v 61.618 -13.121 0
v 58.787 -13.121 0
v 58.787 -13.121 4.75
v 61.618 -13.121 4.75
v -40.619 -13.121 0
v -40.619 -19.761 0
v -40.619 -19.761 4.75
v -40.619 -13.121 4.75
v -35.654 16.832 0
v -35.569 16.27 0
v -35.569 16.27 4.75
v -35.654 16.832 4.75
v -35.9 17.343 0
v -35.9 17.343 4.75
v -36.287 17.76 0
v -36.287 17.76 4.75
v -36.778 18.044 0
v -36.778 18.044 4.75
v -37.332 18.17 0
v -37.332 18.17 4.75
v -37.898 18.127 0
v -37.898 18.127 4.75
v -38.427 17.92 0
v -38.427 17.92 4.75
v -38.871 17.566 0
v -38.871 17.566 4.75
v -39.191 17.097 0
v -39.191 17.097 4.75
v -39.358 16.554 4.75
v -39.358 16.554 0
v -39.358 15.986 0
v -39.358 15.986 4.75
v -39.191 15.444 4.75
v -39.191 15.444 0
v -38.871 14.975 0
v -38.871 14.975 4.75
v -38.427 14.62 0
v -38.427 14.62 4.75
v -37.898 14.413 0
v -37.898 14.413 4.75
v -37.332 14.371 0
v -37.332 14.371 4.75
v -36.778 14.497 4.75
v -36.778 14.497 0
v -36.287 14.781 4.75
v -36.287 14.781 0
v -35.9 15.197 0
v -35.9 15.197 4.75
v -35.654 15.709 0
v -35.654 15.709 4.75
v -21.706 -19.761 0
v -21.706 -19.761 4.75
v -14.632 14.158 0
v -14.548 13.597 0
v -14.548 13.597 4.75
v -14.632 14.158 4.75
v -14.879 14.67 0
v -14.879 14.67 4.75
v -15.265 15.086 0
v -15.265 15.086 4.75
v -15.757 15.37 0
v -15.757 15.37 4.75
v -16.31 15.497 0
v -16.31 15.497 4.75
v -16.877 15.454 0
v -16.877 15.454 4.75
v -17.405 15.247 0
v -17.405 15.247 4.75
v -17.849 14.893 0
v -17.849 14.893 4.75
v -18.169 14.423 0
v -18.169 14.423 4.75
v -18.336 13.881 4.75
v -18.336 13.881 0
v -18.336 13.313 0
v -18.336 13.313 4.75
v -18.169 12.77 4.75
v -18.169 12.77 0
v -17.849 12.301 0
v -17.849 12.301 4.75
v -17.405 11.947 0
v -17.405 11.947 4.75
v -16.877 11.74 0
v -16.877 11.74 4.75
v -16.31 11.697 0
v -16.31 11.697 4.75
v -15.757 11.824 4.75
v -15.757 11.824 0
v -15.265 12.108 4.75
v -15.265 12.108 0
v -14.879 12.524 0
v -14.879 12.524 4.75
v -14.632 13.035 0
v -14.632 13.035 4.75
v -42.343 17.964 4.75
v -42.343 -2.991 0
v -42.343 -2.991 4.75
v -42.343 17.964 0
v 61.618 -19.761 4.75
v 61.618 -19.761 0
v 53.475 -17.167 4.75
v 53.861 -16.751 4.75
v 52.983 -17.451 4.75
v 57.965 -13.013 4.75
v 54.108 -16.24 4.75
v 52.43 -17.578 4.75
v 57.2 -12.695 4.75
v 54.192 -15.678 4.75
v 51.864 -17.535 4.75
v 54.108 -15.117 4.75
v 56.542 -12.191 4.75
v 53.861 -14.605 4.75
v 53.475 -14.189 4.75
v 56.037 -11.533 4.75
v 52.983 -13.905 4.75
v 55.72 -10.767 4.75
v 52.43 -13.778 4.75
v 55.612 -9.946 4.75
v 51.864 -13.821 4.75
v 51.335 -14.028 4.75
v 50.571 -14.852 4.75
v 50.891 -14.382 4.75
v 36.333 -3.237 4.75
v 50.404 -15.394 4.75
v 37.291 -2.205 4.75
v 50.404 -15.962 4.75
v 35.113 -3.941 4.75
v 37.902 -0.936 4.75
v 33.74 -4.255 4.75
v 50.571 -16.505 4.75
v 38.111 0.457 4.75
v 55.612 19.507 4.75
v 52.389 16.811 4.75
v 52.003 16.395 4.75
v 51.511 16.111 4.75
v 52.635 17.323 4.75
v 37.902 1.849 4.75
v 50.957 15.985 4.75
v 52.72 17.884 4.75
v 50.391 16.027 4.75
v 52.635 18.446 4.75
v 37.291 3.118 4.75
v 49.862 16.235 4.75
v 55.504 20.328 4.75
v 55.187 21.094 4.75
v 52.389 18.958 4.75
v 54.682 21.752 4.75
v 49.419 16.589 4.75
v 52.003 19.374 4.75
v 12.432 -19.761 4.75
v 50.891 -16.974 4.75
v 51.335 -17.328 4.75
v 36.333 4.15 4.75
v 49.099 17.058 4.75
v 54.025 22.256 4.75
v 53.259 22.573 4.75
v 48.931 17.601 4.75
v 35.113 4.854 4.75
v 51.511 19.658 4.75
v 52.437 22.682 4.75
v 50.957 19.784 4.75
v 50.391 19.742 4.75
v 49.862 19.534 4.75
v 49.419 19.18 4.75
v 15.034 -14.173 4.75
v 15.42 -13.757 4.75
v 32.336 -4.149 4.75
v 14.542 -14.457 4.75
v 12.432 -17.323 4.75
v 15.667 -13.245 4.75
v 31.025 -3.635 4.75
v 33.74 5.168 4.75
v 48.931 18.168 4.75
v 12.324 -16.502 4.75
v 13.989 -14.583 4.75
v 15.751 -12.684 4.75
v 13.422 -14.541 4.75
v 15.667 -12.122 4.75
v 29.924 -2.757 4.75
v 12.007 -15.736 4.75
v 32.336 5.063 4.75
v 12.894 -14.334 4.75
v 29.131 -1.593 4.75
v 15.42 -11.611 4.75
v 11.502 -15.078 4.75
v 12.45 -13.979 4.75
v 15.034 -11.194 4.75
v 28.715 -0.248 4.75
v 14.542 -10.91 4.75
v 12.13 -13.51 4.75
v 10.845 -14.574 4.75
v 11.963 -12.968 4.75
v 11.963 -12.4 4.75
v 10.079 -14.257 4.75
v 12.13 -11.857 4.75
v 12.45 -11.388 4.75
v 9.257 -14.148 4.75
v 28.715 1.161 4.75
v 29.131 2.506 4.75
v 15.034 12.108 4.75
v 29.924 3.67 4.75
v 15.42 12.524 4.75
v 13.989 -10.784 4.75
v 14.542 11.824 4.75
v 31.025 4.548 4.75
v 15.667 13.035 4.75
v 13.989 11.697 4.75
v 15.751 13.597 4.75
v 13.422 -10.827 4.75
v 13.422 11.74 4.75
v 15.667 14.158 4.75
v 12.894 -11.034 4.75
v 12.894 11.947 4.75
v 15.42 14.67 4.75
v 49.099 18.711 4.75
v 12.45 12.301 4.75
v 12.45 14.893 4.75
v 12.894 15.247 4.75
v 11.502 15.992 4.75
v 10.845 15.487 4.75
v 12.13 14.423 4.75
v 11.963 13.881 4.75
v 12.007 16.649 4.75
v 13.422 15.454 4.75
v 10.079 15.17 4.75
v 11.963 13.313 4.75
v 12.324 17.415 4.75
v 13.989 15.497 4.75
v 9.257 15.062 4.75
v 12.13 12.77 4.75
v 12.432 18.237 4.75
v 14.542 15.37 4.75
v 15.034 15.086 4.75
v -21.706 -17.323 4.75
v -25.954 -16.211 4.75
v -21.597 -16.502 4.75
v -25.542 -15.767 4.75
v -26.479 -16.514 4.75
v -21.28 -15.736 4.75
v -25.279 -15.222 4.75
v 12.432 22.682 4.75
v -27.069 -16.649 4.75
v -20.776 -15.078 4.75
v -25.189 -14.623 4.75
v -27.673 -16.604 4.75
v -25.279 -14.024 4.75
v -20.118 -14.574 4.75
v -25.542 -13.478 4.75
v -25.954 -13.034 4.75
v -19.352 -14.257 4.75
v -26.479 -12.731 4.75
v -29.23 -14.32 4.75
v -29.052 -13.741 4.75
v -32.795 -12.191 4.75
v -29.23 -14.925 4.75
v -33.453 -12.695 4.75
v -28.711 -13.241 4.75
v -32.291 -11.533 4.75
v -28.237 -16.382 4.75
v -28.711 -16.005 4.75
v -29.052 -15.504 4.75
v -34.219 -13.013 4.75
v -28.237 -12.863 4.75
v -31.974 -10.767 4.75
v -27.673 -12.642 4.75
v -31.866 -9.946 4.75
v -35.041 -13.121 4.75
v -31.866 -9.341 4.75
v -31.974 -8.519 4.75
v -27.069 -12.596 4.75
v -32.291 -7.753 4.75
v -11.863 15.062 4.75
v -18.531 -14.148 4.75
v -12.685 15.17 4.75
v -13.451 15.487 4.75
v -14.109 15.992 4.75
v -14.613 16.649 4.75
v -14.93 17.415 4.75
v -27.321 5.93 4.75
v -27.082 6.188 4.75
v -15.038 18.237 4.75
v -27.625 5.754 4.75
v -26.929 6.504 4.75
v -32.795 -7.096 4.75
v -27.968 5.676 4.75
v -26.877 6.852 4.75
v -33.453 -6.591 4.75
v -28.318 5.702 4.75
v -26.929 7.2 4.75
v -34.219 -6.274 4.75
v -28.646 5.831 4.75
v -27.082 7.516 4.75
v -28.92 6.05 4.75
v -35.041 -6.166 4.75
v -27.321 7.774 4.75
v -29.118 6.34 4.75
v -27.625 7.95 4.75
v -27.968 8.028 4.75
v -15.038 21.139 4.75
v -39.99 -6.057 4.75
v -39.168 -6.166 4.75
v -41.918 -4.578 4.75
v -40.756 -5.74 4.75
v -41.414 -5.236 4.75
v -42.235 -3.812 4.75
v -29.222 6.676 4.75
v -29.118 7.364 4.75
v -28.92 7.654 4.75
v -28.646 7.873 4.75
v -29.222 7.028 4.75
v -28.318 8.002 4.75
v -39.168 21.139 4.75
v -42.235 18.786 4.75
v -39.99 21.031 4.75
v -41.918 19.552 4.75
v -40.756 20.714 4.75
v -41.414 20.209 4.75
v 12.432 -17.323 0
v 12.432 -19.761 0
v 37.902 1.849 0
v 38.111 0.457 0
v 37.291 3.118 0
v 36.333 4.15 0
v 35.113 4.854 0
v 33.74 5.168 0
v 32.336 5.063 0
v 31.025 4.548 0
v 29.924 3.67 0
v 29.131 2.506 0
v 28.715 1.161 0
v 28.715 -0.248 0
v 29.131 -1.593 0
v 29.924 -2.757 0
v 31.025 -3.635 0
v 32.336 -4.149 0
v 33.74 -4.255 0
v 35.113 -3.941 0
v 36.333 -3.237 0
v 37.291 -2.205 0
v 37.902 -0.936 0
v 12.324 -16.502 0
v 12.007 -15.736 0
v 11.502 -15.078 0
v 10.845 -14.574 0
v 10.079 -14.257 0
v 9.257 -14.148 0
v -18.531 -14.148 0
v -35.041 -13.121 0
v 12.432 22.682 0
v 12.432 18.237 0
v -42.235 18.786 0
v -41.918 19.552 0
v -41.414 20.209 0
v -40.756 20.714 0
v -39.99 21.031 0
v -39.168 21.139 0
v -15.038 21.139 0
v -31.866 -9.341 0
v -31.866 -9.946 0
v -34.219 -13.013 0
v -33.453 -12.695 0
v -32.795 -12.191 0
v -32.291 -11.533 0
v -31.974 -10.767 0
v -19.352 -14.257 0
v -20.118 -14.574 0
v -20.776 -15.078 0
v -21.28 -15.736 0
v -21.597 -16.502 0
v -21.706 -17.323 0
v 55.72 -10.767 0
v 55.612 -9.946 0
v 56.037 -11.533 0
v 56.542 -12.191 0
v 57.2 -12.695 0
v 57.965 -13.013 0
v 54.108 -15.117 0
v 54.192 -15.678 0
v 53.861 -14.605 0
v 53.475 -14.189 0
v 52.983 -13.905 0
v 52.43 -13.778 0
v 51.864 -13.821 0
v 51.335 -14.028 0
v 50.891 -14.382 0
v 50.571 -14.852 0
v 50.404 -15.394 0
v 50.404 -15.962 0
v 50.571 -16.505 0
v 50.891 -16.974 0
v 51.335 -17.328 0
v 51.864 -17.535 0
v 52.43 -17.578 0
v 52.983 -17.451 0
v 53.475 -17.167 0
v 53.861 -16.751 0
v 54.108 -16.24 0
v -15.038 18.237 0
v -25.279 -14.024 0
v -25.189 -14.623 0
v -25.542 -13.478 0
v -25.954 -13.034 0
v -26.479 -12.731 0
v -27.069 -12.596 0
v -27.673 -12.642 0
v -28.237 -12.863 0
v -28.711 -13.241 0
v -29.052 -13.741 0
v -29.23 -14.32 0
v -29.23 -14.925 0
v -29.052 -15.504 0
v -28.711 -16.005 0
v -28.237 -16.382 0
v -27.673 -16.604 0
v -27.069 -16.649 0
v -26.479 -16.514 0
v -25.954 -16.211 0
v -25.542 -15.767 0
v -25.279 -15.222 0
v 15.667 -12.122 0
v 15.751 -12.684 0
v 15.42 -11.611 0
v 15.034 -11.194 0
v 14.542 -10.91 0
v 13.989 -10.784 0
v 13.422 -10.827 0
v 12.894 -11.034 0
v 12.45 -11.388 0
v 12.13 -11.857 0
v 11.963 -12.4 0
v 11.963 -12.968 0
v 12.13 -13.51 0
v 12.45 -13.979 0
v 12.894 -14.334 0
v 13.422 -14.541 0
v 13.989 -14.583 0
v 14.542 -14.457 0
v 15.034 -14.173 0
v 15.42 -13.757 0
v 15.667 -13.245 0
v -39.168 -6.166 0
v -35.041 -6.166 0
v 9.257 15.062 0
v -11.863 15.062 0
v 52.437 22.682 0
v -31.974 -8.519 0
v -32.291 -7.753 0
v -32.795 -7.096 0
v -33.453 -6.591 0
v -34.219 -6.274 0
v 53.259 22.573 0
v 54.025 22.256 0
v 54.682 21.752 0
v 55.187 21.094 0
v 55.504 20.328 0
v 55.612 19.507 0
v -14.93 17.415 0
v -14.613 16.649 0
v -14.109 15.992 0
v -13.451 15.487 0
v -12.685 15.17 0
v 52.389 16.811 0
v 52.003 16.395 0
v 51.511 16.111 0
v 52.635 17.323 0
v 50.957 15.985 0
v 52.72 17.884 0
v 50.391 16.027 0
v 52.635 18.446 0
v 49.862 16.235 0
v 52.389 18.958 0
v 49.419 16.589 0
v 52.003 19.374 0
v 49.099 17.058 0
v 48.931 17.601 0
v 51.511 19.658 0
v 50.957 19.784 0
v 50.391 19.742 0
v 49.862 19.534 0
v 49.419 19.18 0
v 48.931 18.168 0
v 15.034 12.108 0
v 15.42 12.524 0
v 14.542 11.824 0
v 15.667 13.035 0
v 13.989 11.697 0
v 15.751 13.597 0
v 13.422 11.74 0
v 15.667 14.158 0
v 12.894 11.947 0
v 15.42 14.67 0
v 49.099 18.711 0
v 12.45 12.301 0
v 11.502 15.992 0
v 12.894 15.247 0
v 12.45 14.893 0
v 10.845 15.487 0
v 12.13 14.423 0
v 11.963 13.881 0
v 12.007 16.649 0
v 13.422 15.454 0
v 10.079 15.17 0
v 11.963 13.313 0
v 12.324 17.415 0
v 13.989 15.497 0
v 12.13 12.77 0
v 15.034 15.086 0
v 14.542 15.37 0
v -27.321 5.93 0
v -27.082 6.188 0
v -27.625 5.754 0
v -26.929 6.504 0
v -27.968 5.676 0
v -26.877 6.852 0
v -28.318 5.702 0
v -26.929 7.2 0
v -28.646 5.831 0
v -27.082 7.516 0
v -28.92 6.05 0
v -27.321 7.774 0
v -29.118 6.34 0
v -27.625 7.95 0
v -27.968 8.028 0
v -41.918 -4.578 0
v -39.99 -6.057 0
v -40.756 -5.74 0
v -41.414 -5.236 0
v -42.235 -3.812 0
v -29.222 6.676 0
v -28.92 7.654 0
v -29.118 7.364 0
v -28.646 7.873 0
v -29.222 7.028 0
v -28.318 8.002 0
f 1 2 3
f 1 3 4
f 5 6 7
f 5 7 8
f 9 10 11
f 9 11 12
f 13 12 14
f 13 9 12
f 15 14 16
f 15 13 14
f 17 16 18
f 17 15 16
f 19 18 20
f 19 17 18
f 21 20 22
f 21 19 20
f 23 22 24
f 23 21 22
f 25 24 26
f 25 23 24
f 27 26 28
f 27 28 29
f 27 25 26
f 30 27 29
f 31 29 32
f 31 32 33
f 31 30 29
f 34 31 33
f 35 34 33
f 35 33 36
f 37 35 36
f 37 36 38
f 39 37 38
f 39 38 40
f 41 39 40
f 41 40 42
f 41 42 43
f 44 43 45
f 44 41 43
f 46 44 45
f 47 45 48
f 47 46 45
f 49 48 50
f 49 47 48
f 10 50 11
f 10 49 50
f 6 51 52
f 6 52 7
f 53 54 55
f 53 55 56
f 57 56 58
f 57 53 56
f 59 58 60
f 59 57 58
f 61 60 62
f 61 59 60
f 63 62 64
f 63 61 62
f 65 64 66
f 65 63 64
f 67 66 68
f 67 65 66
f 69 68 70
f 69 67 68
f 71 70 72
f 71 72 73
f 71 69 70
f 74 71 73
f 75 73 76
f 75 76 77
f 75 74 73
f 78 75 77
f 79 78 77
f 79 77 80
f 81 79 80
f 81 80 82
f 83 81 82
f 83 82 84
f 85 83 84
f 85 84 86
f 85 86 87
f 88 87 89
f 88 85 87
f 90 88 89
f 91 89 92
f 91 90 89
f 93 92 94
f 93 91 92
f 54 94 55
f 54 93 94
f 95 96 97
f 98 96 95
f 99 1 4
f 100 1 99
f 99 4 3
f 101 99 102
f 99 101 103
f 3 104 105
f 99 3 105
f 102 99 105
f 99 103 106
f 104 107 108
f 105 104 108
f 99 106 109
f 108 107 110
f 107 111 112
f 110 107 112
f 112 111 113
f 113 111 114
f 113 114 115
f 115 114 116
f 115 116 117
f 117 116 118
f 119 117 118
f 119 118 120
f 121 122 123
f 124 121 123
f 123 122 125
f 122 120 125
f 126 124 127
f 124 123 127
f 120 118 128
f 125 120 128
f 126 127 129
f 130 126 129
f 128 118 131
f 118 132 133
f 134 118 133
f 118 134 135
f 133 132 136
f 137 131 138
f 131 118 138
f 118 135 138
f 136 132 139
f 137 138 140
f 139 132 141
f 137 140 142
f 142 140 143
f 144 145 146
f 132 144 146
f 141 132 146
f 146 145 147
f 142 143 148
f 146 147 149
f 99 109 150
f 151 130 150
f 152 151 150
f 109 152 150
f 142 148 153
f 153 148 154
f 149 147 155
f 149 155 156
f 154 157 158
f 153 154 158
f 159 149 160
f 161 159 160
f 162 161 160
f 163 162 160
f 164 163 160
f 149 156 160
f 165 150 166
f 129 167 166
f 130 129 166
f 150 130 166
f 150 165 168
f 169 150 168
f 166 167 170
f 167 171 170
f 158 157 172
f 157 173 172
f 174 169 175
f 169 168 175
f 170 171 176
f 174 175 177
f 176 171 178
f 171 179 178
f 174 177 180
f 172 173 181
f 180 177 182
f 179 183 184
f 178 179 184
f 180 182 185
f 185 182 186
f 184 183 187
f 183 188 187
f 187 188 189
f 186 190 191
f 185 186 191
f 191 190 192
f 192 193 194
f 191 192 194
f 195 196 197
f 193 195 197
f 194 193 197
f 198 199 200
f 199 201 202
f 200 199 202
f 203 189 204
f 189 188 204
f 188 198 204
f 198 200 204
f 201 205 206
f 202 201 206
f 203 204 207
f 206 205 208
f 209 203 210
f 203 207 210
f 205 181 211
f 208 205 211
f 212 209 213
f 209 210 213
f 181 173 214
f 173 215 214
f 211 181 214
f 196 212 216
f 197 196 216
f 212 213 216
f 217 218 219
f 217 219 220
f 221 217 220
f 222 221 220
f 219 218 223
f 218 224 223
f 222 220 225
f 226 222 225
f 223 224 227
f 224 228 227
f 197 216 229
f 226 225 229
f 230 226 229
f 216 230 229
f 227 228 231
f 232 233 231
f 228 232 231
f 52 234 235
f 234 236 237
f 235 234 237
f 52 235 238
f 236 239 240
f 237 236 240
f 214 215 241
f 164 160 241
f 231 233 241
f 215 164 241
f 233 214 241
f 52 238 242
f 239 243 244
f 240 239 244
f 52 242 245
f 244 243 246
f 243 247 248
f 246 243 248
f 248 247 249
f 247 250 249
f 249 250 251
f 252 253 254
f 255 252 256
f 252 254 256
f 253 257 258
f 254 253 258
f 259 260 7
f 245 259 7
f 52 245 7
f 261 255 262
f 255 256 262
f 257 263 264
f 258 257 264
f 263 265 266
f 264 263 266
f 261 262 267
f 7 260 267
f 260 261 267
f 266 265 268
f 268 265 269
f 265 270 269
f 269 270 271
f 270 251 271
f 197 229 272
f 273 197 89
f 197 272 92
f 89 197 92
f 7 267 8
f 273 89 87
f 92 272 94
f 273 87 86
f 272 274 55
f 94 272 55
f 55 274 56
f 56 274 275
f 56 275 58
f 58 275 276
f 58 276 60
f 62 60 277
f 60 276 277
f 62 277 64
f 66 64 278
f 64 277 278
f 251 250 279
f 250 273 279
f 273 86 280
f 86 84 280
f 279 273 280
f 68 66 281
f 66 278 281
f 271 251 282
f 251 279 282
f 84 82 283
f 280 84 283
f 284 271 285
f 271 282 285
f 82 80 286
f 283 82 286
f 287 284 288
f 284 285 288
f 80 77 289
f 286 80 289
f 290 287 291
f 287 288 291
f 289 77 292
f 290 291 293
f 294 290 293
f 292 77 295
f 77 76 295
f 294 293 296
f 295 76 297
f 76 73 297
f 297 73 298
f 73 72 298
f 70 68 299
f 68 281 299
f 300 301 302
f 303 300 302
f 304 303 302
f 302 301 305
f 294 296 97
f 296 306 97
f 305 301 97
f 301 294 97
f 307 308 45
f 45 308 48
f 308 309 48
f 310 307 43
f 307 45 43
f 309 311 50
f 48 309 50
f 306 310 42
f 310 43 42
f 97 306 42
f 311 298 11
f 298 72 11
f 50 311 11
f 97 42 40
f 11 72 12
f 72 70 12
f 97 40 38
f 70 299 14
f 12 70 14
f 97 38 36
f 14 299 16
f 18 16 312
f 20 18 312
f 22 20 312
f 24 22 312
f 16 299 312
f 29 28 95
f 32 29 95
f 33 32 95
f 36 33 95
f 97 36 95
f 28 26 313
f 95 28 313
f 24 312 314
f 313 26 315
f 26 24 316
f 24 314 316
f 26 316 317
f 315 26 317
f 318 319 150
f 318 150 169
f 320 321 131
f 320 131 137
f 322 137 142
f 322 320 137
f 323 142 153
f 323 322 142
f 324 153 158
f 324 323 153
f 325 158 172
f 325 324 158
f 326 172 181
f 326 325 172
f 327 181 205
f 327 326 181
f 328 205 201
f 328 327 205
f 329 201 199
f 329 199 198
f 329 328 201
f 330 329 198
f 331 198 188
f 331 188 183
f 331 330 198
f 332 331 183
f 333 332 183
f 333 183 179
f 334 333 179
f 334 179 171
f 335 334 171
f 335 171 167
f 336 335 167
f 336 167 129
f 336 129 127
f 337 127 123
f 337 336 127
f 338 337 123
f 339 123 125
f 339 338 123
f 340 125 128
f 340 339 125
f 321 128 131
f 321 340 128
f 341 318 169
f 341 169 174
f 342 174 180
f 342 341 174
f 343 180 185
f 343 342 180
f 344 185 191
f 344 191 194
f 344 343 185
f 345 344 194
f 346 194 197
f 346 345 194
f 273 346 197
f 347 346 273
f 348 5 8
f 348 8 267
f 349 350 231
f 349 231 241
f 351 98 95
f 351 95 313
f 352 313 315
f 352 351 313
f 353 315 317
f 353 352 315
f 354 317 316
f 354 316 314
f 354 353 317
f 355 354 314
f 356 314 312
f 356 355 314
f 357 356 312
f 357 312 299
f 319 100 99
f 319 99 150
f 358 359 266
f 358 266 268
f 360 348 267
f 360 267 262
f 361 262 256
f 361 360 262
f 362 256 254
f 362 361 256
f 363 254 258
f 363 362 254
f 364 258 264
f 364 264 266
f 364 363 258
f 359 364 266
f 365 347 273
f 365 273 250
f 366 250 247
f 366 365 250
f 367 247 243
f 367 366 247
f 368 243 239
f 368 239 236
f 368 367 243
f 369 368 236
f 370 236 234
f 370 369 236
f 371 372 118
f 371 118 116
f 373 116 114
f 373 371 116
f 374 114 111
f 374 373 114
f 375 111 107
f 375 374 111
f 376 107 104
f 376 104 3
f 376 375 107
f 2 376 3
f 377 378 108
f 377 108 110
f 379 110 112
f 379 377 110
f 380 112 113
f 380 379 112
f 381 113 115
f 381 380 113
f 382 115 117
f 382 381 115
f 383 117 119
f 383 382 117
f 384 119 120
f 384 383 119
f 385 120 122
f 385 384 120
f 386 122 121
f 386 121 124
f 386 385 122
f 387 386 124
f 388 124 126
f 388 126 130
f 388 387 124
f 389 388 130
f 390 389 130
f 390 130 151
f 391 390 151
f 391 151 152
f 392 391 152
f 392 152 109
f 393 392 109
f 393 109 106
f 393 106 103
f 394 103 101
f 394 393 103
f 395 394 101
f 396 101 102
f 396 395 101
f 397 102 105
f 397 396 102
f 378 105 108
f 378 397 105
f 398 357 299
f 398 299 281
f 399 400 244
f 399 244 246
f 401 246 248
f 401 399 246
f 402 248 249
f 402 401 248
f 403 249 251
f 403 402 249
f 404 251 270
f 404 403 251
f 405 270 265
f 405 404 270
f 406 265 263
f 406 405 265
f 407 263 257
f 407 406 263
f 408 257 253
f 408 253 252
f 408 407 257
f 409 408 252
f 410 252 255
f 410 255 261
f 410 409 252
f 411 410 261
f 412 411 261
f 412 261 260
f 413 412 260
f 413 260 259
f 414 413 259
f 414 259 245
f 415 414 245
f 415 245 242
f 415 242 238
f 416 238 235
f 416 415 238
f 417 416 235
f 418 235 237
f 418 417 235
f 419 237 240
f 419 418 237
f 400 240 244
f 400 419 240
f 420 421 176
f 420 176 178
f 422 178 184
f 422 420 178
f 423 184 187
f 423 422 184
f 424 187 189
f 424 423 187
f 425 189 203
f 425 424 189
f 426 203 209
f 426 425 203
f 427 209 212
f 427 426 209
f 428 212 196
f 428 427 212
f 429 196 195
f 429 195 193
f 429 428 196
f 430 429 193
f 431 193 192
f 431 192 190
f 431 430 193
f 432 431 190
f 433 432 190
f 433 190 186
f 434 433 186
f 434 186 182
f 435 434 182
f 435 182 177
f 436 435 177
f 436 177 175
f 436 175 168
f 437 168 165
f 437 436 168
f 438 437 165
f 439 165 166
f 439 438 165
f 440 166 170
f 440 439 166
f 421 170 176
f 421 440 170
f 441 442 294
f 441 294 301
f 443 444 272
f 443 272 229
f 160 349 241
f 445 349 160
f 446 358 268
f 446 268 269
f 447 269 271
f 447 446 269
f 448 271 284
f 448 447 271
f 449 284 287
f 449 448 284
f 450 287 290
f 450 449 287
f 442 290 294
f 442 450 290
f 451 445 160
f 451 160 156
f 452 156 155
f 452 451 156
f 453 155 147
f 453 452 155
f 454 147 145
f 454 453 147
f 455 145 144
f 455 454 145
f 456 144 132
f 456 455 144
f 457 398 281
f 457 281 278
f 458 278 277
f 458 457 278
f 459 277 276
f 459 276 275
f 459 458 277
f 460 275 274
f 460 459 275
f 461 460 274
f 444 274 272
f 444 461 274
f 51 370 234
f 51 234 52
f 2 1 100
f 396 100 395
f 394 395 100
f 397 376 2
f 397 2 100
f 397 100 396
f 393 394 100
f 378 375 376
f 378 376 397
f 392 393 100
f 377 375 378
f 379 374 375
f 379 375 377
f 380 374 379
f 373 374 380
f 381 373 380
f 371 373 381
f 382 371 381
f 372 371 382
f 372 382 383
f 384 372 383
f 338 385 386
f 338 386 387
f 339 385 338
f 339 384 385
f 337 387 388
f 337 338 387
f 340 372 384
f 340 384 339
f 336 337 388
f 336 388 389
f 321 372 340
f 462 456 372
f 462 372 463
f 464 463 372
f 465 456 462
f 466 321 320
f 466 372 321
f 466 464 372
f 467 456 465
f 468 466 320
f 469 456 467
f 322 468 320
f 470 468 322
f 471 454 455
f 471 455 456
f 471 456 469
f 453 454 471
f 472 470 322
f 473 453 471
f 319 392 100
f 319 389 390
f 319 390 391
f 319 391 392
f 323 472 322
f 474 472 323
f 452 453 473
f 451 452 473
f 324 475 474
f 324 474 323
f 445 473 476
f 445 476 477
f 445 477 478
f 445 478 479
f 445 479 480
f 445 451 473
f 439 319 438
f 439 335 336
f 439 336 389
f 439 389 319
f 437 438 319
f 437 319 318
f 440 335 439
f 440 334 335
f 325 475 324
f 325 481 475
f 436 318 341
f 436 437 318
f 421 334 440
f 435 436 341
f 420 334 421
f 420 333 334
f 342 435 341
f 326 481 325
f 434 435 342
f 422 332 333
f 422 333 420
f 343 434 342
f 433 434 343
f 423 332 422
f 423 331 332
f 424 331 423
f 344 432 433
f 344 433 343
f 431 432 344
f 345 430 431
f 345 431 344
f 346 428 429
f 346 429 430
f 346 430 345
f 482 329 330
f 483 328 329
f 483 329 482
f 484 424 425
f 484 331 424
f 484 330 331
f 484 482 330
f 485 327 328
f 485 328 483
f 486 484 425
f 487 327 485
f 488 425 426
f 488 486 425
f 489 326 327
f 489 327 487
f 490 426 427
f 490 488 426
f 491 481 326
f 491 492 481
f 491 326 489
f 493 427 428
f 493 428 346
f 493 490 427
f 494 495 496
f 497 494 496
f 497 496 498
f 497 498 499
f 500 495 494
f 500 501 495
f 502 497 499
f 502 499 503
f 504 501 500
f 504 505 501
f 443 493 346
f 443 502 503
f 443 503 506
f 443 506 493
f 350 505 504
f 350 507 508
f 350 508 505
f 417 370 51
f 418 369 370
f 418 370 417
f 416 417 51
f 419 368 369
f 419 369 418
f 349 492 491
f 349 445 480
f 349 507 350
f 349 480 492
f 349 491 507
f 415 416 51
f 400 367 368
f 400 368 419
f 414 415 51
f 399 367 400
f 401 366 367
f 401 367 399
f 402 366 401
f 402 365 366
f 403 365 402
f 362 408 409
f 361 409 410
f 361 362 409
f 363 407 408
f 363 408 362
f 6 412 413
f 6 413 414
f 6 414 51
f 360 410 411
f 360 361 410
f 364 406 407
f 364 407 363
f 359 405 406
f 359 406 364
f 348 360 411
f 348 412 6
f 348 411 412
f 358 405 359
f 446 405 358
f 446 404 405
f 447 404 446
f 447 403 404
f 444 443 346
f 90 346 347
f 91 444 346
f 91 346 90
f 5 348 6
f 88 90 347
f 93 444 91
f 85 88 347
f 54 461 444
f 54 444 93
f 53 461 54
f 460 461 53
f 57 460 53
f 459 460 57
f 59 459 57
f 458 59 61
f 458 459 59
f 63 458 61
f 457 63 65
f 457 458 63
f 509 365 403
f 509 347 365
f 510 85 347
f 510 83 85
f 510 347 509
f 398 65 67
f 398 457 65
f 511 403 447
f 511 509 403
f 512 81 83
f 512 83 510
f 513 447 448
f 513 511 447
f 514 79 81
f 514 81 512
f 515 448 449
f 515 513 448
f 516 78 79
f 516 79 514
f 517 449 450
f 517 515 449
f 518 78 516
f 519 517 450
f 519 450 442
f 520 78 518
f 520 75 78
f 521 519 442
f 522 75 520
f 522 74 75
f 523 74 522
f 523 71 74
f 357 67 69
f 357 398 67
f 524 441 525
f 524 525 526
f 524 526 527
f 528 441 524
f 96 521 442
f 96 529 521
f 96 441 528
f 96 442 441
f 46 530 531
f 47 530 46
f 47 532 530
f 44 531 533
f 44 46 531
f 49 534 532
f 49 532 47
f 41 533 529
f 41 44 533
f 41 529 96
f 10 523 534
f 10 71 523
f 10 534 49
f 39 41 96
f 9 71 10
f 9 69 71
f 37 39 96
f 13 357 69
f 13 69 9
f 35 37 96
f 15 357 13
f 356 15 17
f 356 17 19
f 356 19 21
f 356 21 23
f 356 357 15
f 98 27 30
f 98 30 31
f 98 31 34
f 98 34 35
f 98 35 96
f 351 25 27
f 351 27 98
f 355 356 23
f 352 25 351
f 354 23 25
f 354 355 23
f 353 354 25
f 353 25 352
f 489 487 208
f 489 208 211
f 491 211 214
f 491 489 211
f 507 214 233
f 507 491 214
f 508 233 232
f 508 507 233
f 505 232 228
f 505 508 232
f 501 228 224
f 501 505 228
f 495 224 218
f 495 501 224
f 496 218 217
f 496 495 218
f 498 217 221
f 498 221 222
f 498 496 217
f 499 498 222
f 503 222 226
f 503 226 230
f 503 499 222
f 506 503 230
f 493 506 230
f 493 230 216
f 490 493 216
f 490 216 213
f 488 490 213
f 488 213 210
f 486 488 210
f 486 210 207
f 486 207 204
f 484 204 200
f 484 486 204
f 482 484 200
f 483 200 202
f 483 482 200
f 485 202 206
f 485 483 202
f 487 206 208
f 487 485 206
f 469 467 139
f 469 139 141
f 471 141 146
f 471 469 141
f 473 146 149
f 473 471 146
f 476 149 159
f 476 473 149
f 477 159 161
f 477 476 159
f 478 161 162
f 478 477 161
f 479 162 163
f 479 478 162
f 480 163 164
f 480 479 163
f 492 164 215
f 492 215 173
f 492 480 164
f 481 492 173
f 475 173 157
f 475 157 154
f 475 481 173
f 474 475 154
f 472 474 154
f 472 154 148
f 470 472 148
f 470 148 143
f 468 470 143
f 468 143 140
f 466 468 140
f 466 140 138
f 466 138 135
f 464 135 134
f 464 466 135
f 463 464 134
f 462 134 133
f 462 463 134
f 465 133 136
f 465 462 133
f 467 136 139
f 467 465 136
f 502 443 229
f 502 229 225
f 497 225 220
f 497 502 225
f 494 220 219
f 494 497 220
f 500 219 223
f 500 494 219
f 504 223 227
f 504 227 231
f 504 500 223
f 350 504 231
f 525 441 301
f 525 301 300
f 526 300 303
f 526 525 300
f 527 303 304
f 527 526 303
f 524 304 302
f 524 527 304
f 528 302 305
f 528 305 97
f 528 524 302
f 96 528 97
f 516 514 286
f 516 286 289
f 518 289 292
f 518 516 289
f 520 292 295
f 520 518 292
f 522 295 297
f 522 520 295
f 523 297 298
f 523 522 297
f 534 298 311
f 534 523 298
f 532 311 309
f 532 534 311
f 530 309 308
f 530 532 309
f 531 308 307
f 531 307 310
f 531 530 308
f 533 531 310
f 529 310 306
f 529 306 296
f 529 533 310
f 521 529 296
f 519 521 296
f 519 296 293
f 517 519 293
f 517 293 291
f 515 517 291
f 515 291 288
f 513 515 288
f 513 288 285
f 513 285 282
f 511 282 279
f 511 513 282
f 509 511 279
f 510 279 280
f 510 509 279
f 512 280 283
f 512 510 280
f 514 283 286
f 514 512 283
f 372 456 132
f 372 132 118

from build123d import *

# Parameters (mm, degrees)
SKETCH4_R      = 2.031992692
SKETCH4_R_2    = 1.179287719
SKETCH4_R_3    = 1.905
SKETCH4_R_4    = 4.7244
EXTRUDE3_DEPTH = 4.7498


with BuildPart() as part:
    # Sketch4 → Extrude3 (new body)
    with BuildSketch(Plane.XY):
        with BuildLine():
            Line((-42.343481517, -2.990600597), (-42.343481517, 17.964399403))
            ThreePointArc((-42.343481517, 17.964399403), (-41.413545547, 20.209463433), (-39.168481517, 21.139399403))
            Line((-39.168481517, 21.139399403), (-15.038481517, 21.139399403))
            Line((-15.038481517, 21.139399403), (-15.038481517, 18.236569756))
            ThreePointArc((-15.038481517, 18.236569756), (-14.108545547, 15.991505726), (-11.863481517, 15.061569756))
            Line((-11.863481517, 15.061569756), (9.257081626, 15.061569756))
            ThreePointArc((9.257081626, 15.061569756), (11.502145656, 15.991505726), (12.432081626, 18.236569756))
            Line((12.432081626, 18.236569756), (12.432081626, 22.681569756))
            Line((12.432081626, 22.681569756), (52.437081626, 22.681569756))
            ThreePointArc((52.437081626, 22.681569756), (54.682145656, 21.751633786), (55.612081626, 19.506569756))
            Line((55.612081626, 19.506569756), (55.612081626, -9.945714332))
            ThreePointArc((55.612081626, -9.945714332), (56.542017596, -12.190778362), (58.787081626, -13.120714332))
            Line((58.787081626, -13.120714332), (61.618454053, -13.120714332))
            Line((61.618454053, -13.120714332), (61.618454053, -19.76149571))
            Line((61.618454053, -19.76149571), (12.432081626, -19.76149571))
            Line((12.432081626, -19.76149571), (12.432081626, -17.323430244))
            ThreePointArc((12.432081626, -17.323430244), (11.502145656, -15.078366214), (9.257081626, -14.148430244))
            Line((9.257081626, -14.148430244), (-18.530518374, -14.148430244))
            ThreePointArc((-18.530518374, -14.148430244), (-20.775582404, -15.078366214), (-21.705518374, -17.323430244))
            Line((-21.705518374, -17.323430244), (-21.705518374, -19.76149571))
            Line((-21.705518374, -19.76149571), (-40.618560355, -19.76149571))
            Line((-40.618560355, -19.76149571), (-40.618560355, -13.120714332))
            Line((-40.618560355, -13.120714332), (-35.040518374, -13.120714332))
            ThreePointArc((-35.040518374, -13.120714332), (-32.795454344, -12.190778362), (-31.865518374, -9.945714332))
            Line((-31.865518374, -9.945714332), (-31.865518374, -9.340600597))
            ThreePointArc((-31.865518374, -9.340600597), (-32.795454344, -7.095536567), (-35.040518374, -6.165600597))
            Line((-35.040518374, -6.165600597), (-39.168481517, -6.165600597))
            ThreePointArc((-39.168481517, -6.165600597), (-41.413545547, -5.235664628), (-42.343481517, -2.990600597))
        make_face()
        with Locations((-27.221195322, -14.622613425)):
            Circle(SKETCH4_R, mode=Mode.SUBTRACT)
        with Locations((-28.055981517, 6.851899403)):
            Circle(SKETCH4_R_2, mode=Mode.SUBTRACT)
        with Locations((52.287415303, -15.678066597)):
            Circle(SKETCH4_R_3, mode=Mode.SUBTRACT)
        with Locations((33.387081626, 0.456569756)):
            Circle(SKETCH4_R_4, mode=Mode.SUBTRACT)
        with Locations((13.846294556, -12.683763681)):
            Circle(SKETCH4_R_3, mode=Mode.SUBTRACT)
        with Locations((13.846294556, 13.596903192)):
            Circle(SKETCH4_R_3, mode=Mode.SUBTRACT)
        with Locations((-37.474326825, 16.270244711)):
            Circle(SKETCH4_R_3, mode=Mode.SUBTRACT)
        with Locations((-16.452694446, 13.596903192)):
            Circle(SKETCH4_R_3, mode=Mode.SUBTRACT)
        with Locations((50.814973838, 17.884461968)):
            Circle(SKETCH4_R_3, mode=Mode.SUBTRACT)
    extrude(amount=EXTRUDE3_DEPTH)


solid = part.part
